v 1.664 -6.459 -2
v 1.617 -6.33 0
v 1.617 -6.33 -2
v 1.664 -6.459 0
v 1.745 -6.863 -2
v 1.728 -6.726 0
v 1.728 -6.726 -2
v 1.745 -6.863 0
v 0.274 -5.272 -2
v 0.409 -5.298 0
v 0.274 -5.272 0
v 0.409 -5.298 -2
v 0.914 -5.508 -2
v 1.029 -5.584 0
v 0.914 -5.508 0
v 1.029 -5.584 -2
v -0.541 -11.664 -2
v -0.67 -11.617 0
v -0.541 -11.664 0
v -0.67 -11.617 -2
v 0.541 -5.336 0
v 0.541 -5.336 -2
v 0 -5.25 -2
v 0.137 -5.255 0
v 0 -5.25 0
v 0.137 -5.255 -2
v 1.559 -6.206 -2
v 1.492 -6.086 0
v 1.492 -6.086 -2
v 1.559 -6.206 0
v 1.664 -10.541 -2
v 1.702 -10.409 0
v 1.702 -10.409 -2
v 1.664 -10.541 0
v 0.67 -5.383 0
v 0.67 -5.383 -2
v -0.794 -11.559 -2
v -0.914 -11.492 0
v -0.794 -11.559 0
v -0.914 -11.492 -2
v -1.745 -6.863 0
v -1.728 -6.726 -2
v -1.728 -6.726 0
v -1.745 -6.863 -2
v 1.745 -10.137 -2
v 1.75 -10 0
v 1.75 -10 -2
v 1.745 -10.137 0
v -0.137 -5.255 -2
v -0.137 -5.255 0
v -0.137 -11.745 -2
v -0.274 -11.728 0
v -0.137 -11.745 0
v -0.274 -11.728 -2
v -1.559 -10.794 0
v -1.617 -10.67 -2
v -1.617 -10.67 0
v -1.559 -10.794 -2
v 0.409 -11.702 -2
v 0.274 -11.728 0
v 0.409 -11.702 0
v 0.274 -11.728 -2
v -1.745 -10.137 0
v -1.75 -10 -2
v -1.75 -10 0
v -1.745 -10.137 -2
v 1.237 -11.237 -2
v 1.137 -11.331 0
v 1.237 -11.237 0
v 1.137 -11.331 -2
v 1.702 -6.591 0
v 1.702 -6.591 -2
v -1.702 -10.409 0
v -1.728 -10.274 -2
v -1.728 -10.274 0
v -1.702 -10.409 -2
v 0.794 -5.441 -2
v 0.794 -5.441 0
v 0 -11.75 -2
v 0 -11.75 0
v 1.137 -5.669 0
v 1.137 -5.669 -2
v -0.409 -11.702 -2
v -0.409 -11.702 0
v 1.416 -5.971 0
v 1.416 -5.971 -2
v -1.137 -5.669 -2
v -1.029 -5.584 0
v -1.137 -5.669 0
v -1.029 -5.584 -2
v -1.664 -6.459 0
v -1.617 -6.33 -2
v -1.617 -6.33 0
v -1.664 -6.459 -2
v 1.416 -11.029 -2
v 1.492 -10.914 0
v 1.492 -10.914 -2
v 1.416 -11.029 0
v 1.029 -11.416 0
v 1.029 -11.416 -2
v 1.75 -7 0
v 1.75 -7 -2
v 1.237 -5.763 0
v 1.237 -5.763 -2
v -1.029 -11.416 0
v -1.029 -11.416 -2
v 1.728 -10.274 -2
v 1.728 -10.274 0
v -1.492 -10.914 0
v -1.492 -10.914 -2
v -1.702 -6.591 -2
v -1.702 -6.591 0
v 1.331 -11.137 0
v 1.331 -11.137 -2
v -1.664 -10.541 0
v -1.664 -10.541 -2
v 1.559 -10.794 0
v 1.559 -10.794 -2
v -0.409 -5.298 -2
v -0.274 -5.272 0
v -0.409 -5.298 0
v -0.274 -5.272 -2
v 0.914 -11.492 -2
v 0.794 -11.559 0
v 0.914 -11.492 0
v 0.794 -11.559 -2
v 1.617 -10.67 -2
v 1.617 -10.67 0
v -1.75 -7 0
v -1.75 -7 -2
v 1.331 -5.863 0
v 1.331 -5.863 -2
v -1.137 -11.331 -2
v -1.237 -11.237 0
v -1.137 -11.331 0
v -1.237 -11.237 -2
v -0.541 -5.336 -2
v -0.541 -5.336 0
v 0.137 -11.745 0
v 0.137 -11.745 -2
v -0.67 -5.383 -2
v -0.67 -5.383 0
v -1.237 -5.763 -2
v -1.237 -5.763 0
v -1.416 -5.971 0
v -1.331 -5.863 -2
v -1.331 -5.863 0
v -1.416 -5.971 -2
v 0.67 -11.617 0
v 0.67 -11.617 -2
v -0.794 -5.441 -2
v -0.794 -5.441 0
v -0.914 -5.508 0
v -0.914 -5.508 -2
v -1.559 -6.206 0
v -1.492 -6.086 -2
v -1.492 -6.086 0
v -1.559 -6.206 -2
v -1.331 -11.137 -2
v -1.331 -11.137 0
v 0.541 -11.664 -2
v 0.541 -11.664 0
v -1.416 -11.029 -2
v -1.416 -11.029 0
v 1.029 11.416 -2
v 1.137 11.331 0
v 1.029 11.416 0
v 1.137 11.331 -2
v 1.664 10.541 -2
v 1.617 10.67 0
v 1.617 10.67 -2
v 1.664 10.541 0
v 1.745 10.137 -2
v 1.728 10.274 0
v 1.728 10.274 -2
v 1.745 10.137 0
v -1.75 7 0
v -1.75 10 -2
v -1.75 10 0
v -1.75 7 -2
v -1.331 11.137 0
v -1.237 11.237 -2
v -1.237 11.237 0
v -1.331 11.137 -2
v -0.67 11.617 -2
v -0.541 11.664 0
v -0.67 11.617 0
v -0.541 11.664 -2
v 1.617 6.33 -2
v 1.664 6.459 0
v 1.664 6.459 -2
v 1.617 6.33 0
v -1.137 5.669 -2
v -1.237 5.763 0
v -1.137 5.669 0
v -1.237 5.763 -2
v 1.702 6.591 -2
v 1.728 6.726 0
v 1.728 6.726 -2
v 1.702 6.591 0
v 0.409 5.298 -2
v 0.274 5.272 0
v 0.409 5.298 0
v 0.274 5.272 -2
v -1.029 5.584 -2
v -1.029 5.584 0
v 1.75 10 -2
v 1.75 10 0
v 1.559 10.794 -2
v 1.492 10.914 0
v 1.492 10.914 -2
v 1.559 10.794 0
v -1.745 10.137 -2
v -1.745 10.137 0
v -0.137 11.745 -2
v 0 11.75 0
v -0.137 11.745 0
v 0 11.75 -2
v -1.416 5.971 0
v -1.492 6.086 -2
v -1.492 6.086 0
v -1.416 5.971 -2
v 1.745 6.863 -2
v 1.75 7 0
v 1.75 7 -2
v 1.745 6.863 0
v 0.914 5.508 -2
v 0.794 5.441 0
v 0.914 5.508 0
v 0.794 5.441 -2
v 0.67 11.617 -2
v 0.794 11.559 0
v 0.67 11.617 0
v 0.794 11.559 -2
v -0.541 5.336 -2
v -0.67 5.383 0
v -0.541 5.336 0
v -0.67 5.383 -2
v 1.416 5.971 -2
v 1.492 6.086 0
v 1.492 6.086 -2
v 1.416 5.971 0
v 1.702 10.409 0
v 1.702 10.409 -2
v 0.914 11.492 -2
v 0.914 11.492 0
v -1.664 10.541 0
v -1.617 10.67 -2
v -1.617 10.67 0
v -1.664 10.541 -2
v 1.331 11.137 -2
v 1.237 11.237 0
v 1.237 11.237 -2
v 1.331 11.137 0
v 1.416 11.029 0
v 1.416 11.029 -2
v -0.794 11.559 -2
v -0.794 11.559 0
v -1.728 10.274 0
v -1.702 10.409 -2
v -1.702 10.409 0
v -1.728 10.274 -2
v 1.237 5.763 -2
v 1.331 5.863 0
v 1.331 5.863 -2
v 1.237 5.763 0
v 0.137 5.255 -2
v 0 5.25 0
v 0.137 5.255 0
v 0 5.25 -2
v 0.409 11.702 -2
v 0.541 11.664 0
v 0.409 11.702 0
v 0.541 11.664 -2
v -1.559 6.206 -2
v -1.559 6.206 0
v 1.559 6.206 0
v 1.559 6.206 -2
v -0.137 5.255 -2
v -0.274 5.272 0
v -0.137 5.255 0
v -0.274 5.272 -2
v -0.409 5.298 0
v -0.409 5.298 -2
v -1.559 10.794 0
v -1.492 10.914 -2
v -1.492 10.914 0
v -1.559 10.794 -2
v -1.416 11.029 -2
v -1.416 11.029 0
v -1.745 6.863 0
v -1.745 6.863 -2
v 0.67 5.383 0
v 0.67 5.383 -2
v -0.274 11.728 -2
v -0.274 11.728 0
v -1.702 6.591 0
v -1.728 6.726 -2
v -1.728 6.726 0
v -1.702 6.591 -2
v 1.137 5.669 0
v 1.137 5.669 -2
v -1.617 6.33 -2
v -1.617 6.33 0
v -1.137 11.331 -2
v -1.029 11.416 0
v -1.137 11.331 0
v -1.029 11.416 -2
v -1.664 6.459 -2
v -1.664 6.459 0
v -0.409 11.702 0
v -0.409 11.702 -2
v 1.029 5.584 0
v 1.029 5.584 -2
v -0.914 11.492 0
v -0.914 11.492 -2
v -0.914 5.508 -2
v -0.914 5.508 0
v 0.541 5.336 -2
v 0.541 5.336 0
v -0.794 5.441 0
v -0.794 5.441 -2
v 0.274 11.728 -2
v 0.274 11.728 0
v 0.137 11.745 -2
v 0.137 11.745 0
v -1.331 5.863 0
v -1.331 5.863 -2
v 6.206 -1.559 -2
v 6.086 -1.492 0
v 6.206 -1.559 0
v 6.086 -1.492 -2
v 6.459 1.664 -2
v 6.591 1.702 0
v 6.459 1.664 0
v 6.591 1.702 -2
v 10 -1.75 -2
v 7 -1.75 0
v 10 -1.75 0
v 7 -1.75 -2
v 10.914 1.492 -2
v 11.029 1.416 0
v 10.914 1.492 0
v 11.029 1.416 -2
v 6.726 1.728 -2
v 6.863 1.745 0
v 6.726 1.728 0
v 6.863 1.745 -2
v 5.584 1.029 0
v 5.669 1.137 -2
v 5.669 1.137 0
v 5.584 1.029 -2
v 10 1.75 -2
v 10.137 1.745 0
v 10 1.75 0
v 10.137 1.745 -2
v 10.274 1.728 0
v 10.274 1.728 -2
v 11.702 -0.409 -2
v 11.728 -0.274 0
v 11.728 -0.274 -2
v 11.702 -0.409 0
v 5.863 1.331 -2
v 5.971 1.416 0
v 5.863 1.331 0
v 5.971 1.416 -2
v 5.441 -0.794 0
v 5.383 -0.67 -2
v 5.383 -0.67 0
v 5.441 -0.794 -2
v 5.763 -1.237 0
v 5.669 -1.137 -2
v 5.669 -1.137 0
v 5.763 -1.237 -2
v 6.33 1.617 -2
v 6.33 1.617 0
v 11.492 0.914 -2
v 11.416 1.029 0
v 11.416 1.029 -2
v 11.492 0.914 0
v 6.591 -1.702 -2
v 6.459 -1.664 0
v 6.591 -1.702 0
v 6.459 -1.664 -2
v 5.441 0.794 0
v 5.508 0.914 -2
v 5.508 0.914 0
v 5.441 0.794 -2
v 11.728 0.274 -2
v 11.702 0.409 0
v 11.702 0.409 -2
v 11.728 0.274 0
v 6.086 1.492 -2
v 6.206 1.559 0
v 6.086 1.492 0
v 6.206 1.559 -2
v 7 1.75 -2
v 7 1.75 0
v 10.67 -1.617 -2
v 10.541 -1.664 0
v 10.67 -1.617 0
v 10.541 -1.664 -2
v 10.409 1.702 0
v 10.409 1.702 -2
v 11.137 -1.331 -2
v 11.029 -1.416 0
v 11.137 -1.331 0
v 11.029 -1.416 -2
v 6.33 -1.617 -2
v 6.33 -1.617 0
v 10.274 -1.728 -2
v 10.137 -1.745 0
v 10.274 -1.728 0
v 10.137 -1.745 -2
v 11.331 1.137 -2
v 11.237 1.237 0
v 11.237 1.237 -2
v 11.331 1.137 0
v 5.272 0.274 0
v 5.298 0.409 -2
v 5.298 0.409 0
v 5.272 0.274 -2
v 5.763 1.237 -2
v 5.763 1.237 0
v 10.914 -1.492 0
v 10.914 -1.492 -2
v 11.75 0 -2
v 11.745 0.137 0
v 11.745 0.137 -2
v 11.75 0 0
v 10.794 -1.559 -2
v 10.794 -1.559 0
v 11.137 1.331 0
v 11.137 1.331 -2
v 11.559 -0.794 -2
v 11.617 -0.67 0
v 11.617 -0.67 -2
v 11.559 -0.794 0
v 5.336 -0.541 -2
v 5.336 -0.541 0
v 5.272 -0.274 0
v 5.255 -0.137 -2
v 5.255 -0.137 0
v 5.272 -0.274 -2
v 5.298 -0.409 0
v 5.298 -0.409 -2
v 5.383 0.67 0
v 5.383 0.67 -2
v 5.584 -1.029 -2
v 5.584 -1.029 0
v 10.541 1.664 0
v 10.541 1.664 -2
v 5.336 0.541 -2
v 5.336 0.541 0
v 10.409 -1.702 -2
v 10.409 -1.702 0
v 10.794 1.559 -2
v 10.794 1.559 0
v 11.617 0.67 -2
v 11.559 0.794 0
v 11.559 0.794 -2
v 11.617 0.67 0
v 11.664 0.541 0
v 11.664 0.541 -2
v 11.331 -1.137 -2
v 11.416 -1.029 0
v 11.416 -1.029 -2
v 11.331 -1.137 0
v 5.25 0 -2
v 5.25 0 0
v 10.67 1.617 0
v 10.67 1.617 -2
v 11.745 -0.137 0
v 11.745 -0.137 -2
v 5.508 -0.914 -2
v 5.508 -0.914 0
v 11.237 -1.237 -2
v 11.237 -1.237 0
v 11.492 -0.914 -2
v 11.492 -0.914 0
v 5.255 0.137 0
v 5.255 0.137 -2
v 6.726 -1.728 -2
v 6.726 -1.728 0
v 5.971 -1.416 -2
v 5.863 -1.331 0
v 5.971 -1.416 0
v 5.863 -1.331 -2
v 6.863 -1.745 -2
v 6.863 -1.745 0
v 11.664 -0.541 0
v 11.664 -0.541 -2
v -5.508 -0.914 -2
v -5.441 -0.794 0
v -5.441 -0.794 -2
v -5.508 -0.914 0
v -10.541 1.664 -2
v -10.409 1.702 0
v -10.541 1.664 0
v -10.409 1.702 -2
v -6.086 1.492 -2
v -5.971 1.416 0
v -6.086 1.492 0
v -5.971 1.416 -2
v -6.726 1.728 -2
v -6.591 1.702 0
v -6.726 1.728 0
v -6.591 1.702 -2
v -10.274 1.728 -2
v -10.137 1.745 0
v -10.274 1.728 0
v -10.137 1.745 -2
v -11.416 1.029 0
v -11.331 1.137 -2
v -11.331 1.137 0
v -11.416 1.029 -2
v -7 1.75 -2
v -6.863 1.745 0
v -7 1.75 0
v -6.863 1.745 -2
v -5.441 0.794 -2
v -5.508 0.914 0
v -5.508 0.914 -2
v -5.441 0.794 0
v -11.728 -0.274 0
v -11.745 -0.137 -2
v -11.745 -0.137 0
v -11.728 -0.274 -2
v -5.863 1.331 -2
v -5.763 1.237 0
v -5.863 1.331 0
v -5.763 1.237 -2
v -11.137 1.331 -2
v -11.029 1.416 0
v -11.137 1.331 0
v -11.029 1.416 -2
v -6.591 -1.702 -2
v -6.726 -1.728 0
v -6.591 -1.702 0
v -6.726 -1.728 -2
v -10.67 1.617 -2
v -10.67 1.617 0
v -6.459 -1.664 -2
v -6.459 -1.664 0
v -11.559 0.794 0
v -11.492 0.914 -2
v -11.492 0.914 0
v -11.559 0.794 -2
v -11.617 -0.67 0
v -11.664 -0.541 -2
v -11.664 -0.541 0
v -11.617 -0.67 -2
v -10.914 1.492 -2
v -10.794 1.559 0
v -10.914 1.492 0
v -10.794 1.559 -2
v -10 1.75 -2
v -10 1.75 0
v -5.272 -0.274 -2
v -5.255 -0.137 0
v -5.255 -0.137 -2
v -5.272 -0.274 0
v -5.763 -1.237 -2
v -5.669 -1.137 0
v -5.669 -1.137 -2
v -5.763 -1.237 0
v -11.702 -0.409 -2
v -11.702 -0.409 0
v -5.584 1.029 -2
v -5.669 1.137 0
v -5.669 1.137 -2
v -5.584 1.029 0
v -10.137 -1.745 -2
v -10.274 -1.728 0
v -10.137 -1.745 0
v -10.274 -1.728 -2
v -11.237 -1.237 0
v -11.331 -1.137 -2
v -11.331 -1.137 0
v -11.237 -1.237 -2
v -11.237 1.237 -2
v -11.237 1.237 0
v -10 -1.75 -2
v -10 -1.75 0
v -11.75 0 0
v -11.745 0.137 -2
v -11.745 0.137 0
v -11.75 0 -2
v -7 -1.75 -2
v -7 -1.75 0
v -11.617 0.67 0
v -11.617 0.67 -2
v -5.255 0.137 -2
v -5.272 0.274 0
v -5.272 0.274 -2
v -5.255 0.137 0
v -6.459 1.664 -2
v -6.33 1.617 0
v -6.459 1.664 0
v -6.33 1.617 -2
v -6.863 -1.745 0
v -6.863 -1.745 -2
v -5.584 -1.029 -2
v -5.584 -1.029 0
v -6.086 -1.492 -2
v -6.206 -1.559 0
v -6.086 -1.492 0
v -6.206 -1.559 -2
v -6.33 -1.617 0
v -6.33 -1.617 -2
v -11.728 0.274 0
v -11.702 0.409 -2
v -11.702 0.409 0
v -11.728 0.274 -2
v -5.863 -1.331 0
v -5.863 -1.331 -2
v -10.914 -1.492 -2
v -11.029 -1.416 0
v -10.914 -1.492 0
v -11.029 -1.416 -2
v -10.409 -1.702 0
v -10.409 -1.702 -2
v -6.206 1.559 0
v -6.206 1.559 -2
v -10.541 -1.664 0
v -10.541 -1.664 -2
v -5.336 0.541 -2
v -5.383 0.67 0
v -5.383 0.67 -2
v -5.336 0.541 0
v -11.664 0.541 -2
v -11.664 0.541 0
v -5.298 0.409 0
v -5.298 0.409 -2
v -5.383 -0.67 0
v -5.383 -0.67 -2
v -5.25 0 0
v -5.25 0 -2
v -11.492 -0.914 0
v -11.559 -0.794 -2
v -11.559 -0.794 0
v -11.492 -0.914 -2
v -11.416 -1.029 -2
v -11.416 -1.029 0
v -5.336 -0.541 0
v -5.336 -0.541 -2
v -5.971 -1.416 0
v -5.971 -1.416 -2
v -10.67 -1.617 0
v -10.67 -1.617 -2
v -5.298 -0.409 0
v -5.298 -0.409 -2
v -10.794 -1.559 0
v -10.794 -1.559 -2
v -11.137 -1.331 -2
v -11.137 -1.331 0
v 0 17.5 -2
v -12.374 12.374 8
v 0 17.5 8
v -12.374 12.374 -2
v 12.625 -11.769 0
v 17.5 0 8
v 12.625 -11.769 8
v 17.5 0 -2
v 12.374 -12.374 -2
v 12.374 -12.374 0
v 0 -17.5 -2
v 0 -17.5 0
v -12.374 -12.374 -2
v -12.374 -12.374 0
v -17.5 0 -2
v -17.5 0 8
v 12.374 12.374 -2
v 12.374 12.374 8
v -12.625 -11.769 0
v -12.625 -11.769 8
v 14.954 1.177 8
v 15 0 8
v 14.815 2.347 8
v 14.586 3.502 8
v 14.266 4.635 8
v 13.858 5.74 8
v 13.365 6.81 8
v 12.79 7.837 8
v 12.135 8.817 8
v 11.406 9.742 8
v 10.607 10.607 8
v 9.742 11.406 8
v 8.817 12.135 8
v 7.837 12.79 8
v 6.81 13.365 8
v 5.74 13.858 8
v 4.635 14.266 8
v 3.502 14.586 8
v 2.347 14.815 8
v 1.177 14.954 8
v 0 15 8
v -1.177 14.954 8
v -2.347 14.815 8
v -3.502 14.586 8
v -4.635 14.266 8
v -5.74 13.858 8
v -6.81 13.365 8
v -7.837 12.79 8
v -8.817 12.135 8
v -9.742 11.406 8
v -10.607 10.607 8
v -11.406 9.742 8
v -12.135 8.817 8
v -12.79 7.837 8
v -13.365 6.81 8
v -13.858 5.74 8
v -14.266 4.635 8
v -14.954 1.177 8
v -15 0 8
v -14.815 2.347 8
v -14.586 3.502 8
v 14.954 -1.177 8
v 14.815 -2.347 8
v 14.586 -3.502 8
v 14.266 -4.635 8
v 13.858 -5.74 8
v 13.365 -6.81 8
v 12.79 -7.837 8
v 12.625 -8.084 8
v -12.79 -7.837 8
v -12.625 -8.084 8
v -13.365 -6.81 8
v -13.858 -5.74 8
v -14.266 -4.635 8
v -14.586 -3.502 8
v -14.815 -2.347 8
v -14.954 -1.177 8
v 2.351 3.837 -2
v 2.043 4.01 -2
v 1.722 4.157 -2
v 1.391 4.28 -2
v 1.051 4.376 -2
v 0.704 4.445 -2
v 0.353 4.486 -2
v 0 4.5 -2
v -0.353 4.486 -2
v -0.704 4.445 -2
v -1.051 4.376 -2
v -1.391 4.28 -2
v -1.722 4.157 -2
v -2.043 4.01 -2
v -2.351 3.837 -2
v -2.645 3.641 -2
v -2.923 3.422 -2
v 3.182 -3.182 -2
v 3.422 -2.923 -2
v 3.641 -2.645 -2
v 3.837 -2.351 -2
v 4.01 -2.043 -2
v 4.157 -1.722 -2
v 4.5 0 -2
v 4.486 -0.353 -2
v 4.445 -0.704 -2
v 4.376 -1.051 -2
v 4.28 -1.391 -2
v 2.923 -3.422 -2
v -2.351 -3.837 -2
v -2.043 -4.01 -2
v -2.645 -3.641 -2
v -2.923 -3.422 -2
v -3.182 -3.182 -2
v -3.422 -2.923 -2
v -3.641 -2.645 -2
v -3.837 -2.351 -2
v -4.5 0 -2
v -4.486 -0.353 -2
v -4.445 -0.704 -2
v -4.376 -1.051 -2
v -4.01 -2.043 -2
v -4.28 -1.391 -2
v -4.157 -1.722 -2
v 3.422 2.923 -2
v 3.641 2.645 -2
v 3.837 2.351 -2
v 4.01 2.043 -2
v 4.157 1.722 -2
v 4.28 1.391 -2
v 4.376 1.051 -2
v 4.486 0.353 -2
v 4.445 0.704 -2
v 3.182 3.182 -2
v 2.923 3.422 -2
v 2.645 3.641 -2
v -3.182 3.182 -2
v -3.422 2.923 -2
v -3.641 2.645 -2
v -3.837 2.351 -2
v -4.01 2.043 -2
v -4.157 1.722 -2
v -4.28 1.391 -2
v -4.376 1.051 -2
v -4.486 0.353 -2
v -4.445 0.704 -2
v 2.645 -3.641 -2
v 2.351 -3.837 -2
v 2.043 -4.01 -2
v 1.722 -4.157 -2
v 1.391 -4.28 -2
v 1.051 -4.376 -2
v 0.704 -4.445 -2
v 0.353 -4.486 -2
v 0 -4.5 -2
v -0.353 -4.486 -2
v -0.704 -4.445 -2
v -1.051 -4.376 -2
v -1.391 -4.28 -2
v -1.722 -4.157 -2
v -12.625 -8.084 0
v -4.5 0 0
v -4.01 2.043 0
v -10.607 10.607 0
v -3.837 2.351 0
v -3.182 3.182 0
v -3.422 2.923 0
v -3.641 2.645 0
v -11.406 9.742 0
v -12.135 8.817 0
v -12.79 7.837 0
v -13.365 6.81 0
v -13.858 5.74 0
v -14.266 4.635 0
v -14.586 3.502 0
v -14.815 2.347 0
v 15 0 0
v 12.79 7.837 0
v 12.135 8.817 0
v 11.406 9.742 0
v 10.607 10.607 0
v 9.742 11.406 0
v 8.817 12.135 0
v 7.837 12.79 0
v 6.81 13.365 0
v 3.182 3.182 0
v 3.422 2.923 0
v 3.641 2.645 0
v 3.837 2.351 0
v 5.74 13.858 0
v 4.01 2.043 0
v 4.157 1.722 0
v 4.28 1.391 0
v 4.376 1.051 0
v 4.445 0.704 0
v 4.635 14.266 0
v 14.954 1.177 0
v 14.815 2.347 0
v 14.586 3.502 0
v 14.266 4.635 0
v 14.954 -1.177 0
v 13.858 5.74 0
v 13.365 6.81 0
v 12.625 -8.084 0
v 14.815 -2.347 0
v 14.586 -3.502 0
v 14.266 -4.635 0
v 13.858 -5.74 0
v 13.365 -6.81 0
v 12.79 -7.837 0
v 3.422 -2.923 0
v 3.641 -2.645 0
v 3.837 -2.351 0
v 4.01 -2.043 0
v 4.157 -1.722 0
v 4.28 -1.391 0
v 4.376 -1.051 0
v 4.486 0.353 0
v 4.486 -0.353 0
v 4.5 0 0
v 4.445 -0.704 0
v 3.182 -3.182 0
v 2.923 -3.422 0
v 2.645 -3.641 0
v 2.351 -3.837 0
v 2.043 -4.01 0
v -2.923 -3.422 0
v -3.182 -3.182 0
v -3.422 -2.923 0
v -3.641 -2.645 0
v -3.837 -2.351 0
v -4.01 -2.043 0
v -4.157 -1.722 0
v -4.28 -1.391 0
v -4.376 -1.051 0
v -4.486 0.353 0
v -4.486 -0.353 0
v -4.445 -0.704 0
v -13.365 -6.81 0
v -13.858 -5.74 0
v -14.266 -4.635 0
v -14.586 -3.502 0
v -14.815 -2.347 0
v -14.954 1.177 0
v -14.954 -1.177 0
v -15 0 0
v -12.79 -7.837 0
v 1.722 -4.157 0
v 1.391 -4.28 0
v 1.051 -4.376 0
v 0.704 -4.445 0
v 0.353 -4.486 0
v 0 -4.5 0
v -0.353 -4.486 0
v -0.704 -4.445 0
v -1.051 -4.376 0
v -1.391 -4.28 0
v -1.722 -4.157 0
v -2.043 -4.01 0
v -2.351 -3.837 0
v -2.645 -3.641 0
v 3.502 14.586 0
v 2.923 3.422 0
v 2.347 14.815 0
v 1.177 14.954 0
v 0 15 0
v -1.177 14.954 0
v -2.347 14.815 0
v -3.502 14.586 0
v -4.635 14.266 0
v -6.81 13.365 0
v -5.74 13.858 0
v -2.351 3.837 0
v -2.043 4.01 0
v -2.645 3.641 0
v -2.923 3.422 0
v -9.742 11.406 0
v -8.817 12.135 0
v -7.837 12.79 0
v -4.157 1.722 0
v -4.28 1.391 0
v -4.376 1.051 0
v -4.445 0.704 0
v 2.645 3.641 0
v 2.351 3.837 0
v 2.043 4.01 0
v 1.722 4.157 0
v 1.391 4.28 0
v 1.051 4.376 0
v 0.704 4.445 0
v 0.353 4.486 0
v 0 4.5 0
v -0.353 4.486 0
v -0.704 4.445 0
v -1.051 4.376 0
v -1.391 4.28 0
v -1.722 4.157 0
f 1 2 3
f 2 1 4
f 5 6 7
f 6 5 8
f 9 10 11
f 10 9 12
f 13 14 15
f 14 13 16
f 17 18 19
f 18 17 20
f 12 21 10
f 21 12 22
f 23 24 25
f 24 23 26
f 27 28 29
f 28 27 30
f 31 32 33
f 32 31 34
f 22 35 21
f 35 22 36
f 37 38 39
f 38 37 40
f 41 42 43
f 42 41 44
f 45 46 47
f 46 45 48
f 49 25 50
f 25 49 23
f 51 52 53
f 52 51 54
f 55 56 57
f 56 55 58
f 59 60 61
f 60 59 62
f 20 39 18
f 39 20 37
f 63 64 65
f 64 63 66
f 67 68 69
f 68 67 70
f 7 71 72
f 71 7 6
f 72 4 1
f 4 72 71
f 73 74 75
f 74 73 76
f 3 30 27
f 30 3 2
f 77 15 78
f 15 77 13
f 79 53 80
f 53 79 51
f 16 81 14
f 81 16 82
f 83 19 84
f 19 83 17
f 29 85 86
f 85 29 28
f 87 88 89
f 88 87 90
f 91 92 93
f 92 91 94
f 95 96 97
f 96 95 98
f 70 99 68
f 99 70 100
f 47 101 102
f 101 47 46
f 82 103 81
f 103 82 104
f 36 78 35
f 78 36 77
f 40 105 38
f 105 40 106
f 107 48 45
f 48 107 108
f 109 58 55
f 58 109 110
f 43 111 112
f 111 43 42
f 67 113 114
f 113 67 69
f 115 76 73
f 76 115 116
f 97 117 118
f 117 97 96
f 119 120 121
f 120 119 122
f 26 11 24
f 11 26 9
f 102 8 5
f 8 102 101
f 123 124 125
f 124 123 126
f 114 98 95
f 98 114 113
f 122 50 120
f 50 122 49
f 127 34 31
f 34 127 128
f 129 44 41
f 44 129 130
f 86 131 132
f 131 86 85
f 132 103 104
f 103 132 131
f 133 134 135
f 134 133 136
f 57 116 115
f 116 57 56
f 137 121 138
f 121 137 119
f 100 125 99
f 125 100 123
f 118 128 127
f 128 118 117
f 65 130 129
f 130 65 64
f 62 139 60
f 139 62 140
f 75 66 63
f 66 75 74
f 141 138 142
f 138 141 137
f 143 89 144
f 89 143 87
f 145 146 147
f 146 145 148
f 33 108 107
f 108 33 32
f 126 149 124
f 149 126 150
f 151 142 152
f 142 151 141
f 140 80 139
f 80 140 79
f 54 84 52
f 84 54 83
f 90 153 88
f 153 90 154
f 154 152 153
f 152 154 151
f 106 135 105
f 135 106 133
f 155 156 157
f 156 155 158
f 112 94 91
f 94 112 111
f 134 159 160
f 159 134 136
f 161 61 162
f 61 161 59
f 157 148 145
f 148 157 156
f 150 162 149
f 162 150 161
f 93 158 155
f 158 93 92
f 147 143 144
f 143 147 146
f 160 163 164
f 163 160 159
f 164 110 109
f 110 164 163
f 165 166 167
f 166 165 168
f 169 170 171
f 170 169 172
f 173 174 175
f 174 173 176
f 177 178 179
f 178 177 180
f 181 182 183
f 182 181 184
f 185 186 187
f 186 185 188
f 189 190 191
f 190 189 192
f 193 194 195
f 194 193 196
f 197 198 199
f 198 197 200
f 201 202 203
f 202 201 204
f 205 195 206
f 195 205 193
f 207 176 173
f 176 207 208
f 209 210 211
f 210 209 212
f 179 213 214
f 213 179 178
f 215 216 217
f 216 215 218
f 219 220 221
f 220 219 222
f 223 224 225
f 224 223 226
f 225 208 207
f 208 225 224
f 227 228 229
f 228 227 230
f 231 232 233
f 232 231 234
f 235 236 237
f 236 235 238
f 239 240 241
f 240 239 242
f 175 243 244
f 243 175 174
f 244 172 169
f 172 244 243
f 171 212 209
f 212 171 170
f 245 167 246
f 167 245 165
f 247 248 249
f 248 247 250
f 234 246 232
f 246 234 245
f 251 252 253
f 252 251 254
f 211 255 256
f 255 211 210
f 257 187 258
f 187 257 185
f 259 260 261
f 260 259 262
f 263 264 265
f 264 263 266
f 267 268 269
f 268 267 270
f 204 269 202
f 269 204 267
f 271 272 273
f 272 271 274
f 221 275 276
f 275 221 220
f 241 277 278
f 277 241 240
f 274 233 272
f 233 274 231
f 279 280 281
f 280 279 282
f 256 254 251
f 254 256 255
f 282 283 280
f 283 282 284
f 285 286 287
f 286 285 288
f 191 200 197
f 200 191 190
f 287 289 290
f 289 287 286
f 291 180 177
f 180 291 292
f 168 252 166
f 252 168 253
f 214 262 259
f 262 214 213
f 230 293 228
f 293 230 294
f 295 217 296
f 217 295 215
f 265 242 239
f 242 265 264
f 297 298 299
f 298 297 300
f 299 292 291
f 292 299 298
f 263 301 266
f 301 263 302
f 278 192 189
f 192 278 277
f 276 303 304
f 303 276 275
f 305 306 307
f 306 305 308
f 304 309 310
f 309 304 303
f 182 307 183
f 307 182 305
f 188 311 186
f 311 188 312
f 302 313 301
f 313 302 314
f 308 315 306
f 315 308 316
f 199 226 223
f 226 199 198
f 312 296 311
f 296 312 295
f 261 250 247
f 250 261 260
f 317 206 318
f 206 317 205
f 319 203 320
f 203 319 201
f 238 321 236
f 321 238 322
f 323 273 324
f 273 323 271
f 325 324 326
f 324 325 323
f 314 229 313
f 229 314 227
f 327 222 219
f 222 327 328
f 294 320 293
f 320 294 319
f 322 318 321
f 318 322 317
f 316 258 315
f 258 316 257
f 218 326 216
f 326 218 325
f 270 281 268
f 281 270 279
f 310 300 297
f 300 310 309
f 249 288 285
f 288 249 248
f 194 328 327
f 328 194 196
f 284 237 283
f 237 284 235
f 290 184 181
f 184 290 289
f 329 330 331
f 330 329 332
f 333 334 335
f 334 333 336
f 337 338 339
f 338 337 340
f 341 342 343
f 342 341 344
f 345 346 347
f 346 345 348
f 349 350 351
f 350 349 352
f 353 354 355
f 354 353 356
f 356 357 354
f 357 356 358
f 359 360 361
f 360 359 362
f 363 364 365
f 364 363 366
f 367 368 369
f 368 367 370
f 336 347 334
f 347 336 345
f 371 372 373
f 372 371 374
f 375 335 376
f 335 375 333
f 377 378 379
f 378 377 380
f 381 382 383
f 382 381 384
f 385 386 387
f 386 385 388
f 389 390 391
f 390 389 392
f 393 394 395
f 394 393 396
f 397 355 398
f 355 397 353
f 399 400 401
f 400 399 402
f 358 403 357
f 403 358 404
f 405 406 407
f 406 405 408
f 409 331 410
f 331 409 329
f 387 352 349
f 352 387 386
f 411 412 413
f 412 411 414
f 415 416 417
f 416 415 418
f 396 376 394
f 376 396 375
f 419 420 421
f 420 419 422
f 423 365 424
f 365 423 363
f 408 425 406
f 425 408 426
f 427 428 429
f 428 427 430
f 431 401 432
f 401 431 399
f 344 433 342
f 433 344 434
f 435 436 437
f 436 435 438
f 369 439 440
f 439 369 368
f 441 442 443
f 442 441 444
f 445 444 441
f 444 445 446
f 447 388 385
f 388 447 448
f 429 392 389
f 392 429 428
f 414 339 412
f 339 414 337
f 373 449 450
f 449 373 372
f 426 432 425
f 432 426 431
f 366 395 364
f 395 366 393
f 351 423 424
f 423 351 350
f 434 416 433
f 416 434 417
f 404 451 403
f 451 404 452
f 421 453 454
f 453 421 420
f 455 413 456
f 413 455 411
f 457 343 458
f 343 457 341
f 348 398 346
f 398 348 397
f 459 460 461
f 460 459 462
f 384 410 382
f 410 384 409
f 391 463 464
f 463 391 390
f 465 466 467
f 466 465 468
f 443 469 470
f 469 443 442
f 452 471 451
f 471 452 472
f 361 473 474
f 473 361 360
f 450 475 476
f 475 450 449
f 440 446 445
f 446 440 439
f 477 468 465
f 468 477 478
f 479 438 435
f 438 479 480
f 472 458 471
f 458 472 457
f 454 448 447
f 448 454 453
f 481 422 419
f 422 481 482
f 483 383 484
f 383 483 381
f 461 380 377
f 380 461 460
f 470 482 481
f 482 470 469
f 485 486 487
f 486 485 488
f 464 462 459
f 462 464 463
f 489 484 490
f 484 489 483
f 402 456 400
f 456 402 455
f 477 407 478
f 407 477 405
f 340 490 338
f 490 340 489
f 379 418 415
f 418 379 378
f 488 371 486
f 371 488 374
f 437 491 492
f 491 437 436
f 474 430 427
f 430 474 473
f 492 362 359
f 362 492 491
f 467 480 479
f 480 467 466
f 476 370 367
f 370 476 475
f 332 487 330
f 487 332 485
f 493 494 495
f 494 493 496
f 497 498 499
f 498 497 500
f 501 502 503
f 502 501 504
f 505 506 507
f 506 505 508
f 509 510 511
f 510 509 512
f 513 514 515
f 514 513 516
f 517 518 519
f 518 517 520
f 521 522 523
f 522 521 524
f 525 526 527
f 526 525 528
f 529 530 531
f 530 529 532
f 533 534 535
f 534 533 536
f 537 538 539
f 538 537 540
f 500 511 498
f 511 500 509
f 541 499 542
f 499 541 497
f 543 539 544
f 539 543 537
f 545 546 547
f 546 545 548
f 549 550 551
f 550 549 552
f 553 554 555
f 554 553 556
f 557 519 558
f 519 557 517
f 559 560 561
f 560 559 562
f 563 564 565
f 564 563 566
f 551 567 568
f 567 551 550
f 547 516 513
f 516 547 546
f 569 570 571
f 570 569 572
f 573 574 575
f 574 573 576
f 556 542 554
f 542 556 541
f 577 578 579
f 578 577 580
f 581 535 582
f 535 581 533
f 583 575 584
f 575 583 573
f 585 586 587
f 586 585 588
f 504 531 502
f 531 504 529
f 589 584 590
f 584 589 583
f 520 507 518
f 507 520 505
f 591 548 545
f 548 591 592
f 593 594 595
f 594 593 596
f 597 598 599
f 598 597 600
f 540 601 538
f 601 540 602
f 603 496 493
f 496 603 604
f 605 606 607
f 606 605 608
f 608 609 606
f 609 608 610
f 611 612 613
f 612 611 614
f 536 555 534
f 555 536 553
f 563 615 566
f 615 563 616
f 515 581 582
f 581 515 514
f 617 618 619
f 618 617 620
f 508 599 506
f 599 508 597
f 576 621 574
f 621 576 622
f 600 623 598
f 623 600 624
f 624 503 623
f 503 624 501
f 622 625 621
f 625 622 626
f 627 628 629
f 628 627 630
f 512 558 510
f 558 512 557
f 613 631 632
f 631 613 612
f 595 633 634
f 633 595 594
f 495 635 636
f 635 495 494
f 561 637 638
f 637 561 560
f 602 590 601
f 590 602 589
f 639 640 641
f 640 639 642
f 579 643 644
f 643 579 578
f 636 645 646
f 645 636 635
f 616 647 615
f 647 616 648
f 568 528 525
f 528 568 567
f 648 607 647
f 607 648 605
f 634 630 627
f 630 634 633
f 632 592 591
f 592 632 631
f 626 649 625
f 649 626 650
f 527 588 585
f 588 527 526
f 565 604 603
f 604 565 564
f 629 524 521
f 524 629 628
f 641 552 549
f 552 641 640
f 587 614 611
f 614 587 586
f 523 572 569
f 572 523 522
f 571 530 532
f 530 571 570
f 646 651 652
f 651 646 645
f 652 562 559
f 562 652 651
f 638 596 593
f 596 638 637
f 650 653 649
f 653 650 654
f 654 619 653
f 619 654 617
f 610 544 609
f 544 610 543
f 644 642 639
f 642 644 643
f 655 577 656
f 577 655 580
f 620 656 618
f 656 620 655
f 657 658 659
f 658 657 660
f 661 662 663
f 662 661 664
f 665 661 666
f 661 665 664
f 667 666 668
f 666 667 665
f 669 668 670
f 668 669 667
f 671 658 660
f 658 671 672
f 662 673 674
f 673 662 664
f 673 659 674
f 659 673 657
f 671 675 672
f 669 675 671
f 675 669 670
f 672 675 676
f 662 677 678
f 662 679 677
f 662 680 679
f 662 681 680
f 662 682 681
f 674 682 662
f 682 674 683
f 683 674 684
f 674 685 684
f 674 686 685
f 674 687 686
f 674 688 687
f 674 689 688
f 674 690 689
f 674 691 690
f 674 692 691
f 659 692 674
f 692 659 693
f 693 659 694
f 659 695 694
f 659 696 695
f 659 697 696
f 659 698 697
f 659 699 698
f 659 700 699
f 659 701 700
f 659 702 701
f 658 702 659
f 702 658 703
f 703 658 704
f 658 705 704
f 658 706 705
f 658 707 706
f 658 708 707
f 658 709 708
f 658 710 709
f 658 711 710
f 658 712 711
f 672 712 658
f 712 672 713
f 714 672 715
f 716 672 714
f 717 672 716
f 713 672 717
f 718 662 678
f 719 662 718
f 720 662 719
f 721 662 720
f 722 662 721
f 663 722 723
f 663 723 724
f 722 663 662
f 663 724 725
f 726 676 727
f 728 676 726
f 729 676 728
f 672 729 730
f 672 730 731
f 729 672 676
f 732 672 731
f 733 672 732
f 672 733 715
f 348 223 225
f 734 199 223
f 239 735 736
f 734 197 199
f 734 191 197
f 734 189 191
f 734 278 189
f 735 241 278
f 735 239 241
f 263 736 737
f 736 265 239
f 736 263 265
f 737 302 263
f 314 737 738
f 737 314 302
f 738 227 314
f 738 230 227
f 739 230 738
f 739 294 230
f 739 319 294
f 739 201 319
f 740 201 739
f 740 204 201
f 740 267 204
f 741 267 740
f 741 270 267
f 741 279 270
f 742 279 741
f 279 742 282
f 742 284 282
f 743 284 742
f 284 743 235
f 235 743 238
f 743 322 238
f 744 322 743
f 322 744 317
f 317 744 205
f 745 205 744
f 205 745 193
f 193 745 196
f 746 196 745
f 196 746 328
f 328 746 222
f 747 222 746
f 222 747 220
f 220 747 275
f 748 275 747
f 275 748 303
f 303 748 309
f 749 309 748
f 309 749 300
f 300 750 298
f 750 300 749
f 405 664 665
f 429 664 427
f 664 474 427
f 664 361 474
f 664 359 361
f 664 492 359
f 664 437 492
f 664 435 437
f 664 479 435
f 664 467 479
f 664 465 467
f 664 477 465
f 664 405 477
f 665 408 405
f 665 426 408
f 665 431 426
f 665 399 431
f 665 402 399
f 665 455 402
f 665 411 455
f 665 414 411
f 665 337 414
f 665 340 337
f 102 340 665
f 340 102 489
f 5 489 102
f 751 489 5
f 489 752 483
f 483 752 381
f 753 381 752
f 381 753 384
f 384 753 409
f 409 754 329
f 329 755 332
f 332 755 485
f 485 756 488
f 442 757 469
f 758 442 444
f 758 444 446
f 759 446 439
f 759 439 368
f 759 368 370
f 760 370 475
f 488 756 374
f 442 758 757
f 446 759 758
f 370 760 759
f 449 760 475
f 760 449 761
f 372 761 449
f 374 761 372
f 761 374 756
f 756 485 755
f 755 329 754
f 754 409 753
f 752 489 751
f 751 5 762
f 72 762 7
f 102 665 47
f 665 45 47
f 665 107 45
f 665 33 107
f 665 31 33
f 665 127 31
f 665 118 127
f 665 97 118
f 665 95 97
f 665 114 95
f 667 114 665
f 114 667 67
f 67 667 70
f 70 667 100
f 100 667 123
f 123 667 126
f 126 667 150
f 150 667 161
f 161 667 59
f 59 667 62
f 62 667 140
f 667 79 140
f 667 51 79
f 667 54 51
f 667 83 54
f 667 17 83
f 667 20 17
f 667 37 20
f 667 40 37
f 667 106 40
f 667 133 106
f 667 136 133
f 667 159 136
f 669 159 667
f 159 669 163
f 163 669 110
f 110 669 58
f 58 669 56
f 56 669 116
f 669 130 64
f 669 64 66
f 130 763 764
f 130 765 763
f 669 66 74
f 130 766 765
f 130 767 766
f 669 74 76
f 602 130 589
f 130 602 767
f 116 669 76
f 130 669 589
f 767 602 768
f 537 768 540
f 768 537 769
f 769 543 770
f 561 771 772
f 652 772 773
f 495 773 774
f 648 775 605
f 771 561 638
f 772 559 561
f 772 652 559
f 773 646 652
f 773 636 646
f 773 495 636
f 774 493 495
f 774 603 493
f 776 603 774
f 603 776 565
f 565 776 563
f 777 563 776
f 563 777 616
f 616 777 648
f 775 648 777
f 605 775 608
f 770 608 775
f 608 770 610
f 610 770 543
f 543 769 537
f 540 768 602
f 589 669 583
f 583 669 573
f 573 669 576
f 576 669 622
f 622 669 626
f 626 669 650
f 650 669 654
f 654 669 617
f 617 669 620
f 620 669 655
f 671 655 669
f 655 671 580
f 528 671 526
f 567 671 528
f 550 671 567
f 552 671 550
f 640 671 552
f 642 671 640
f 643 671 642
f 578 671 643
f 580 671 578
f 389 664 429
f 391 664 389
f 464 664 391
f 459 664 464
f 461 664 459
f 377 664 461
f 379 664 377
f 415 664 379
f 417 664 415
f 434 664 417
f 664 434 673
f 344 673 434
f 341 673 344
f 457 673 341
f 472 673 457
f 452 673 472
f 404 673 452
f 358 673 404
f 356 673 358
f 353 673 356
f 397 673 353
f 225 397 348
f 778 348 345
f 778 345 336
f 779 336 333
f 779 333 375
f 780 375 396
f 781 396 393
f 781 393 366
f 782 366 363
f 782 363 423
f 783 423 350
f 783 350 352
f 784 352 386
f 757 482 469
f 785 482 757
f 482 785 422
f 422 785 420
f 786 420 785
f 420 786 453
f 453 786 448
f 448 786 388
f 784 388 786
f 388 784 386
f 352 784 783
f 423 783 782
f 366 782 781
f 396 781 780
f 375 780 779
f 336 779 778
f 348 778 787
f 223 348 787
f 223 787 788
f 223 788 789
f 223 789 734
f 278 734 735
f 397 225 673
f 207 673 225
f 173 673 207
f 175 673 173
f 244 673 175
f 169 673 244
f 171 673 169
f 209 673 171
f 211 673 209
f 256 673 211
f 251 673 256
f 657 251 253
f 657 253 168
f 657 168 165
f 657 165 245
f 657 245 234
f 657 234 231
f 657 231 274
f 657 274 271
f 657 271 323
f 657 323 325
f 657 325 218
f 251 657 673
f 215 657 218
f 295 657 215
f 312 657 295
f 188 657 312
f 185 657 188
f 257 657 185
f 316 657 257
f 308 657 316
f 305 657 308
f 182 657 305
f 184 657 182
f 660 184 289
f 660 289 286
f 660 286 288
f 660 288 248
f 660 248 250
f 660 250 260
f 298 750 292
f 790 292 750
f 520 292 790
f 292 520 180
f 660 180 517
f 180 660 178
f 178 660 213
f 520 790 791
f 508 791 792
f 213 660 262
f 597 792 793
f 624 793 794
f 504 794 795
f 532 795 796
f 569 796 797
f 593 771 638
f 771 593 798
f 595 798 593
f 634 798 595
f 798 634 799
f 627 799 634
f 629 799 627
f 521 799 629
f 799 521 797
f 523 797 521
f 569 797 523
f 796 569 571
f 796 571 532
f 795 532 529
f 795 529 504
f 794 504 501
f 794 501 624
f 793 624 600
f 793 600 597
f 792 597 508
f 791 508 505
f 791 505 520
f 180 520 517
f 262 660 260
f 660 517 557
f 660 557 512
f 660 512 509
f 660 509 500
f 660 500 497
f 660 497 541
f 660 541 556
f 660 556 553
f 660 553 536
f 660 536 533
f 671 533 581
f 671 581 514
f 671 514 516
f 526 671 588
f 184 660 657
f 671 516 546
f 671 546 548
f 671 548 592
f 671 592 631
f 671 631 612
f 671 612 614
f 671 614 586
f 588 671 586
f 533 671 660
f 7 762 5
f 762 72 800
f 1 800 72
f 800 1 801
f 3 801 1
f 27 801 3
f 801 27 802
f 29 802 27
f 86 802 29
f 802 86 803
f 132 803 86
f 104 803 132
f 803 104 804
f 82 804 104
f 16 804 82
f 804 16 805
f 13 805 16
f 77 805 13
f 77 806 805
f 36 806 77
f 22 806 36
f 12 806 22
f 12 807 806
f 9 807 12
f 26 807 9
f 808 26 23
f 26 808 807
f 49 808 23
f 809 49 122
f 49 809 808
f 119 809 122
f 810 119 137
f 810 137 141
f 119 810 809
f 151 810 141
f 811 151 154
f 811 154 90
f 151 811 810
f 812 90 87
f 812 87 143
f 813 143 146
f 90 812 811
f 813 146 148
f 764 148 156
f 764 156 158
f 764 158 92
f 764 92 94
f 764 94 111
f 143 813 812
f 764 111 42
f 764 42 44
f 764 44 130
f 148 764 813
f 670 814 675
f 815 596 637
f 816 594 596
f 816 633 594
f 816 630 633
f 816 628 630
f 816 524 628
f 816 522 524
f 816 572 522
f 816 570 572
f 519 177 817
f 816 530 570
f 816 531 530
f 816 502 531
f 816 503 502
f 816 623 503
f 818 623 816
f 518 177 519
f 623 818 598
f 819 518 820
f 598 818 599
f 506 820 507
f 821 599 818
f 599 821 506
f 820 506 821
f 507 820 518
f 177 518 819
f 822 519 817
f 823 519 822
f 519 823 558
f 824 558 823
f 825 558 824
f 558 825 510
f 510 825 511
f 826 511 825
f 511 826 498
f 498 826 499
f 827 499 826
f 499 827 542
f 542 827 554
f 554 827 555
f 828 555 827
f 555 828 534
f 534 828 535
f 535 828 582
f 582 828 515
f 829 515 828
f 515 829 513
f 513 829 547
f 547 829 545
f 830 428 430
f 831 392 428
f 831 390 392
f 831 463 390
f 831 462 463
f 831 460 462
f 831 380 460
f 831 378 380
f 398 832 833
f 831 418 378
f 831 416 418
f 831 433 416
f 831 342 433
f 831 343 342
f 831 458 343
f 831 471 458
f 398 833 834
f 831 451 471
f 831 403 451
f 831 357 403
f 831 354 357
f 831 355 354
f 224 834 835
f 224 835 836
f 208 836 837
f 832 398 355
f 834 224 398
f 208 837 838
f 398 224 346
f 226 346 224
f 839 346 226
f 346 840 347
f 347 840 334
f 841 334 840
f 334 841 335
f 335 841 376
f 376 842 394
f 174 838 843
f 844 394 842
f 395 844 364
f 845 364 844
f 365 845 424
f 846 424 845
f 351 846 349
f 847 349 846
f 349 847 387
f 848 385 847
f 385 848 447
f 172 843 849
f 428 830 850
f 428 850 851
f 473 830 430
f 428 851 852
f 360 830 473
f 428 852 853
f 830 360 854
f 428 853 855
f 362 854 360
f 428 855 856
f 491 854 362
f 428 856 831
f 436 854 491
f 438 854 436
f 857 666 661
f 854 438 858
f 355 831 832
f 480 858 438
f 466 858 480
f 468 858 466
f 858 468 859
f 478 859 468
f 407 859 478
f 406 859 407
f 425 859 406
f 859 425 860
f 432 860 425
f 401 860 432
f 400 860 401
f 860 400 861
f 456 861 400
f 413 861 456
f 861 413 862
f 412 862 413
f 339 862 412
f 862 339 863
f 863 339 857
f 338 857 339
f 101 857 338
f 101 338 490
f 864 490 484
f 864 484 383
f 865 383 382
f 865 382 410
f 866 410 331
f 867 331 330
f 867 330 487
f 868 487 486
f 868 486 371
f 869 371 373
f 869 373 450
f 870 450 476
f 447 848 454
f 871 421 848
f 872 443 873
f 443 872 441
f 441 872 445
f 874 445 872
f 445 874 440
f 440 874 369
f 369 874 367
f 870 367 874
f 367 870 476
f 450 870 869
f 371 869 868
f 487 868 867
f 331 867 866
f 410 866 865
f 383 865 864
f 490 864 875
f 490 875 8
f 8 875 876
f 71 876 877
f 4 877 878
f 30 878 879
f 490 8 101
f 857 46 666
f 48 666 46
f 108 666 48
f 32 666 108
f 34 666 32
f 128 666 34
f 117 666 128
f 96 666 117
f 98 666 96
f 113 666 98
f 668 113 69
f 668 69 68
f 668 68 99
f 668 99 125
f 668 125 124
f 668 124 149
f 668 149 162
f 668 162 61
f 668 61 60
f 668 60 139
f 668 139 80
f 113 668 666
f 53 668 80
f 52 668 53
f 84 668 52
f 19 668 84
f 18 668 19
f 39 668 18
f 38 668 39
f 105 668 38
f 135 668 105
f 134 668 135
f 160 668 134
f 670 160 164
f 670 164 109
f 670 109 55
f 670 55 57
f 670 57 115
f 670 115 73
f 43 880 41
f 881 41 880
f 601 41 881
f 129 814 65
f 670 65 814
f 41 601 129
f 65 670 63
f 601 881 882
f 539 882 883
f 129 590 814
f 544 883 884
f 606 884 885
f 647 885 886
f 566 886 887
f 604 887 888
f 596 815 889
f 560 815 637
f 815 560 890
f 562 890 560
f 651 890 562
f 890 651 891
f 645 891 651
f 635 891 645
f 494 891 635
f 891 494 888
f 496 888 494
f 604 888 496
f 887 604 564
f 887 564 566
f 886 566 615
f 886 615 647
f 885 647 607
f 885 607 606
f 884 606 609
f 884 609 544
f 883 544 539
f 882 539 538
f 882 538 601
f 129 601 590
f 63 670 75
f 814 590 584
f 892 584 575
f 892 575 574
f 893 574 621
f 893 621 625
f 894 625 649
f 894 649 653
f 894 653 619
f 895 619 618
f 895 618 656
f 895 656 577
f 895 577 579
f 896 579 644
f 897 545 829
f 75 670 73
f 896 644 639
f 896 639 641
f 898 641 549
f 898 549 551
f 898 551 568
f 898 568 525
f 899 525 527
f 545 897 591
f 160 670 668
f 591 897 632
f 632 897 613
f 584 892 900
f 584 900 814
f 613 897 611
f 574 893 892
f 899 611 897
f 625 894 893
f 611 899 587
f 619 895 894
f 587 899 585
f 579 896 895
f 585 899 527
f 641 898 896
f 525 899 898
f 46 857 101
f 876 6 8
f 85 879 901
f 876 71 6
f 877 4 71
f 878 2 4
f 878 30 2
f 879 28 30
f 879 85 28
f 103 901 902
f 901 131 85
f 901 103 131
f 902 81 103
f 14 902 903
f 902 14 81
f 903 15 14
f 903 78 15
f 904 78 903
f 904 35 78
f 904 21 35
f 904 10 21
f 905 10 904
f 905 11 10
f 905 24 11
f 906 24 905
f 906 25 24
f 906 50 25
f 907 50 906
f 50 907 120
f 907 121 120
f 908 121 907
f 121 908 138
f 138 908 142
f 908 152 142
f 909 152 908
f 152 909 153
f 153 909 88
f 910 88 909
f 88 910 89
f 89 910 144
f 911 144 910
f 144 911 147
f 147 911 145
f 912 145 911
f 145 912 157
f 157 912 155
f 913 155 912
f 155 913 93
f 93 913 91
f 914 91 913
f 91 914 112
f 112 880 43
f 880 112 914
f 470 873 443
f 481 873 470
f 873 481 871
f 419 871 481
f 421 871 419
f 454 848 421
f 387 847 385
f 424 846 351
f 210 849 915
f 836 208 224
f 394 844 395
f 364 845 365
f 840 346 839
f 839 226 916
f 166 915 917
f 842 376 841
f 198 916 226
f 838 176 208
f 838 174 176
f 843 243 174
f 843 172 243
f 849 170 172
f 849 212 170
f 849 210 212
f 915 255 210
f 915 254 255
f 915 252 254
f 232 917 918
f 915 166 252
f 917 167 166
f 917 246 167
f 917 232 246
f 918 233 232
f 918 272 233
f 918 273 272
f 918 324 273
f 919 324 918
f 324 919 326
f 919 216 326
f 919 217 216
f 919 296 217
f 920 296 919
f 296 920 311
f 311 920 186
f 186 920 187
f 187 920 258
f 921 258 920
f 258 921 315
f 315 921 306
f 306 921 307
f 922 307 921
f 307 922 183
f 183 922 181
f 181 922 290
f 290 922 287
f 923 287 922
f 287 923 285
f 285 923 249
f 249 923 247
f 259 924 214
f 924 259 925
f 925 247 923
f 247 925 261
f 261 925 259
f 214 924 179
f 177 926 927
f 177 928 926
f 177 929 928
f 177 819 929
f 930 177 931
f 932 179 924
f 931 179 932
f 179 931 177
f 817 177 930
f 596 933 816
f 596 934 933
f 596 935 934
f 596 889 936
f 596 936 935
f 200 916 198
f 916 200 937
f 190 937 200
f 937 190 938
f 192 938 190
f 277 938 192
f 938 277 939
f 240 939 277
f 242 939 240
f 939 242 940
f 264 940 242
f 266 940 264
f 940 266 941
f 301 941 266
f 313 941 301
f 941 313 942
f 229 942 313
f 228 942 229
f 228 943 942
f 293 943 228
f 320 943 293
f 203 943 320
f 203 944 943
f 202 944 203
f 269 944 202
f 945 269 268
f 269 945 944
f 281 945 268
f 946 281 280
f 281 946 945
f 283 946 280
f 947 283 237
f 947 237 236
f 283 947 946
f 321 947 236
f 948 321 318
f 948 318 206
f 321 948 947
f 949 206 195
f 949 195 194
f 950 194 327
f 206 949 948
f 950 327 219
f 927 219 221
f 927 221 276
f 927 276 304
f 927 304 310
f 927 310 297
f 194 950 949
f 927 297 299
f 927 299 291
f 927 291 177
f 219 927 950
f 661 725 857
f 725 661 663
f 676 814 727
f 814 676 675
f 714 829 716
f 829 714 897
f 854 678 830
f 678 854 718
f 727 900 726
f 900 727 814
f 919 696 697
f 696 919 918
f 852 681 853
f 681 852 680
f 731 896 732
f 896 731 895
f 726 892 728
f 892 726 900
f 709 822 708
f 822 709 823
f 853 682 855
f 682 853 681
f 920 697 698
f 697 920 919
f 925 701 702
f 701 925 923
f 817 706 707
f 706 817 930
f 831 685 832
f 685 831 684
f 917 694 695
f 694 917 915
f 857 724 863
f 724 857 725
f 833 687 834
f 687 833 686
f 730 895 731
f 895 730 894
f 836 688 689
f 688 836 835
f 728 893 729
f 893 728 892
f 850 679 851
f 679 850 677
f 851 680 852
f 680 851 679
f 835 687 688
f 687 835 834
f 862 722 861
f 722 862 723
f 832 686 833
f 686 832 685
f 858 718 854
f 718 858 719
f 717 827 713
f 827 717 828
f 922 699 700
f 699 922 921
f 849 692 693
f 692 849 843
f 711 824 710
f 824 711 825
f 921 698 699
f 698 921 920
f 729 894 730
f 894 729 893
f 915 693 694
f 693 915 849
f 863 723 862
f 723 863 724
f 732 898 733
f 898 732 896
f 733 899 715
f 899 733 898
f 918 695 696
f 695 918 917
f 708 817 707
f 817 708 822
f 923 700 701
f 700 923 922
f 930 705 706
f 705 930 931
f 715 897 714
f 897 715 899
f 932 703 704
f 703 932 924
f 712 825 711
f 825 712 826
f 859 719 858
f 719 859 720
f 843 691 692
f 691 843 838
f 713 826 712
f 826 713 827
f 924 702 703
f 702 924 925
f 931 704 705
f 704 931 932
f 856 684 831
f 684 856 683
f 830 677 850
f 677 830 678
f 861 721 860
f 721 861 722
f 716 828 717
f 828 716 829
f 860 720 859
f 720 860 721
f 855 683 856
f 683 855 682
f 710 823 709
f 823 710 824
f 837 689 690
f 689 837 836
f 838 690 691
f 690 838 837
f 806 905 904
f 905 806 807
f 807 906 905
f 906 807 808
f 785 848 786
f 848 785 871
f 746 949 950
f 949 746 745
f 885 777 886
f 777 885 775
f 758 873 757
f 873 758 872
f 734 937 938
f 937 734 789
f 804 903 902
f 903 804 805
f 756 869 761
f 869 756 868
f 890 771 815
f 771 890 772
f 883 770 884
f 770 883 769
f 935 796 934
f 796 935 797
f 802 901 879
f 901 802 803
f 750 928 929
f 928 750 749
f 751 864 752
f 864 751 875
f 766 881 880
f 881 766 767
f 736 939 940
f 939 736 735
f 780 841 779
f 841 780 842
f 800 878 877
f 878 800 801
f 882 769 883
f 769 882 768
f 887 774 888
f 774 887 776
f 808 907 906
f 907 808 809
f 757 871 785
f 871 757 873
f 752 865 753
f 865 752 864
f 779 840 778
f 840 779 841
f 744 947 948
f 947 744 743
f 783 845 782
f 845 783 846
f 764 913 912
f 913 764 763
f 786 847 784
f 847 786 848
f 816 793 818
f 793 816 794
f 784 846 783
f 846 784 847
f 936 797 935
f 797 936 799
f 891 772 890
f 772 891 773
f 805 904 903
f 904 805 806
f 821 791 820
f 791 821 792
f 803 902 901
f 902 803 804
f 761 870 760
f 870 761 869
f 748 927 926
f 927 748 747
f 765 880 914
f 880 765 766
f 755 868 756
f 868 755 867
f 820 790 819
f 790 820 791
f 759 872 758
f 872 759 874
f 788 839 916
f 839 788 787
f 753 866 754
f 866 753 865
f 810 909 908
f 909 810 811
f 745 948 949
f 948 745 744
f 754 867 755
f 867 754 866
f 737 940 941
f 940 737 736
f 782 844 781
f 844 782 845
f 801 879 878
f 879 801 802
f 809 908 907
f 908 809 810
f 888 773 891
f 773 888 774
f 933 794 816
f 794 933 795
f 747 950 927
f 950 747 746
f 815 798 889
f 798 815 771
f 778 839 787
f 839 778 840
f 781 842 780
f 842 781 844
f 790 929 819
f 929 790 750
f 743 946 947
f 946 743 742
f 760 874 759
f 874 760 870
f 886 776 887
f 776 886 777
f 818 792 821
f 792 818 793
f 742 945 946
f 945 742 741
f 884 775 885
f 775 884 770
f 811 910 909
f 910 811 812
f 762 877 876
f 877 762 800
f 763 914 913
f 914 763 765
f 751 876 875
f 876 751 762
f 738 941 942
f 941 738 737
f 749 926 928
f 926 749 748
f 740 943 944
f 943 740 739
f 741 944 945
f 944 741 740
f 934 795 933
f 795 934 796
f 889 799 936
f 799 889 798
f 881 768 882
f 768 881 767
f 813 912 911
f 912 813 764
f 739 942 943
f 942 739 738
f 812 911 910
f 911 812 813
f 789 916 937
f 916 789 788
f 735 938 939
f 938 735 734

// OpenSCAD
/*
Customisable Motor Protection for Quadcopter

    - by Harlo
    - 16/05/2016
    
    **Standard variables are based on an Emax Nighthawk 250**
*/


//Fixing Screws Diameter
screw_dia = 3.5; //[0:0.25:8]
//Distance Between Screw Centers
screw_seperation = 17; //[0:0.25:50]
//Screw Slide Distance
screw_slide = 3; //[0:0.25:10]
//Rotate the fixings (degrees)
screw_rotation = 0; //[0:1:90]
//Motor Shaft Diameter (add tolerance)
shaft_dia = 9; //[0:0.25:15]
//Arm Diameter (of mount)
arm_dia = 30; //[5:0.25:80]
//Arm Width
arm_width = 25.25; //[3:0.25:80]
//General Smoothness 
resolution = 80; //[20:1:180]
//Outside Diameter
protector_dia = 35; //[20:0.25:120]
//Outer Shape/Smoothness
protector_res = 8; //[8:1:180]
//Protector Height (Total Z)
protector_height = 10; //[1:0.1:60]
//Protector Lower Thickness
protector_bottom_thickness = 2; //[0.5:0.1:10]
//Rotate (for viewing while editing)
turn = -90; //[0:15:360]

//Internal Variables
arm_length = arm_dia*3;
screw_height = 20 * 1;
arm_thickness = 20 * 1;
shaft_height = 20 * 1;

//Render
rotate([0,0,turn]){
    protector_with_cuts();
}

//Modules

module protector_with_cuts(){
    difference(){
        protector();
        cut_arm();
        cut_base();
        cut_screws();
        cut_shaft();        
    }
}

module protector(){
    translate([0,0,protector_height/2 - protector_bottom_thickness]){
        cylinder(h = protector_height, d = protector_dia, center = true, $fn = protector_res);
    }
}


//CUTTING Modules
module cut_shaft(){
    cylinder(h = shaft_height, d = shaft_dia, center = true, $fn = resolution);
}

module cut_screws(){
    rotate([0,0,screw_rotation]){
        screw_placed();
        rotate([0,0,90]){
            screw_placed();
        }
    }
}

module screw_placed(){
    translate([screw_seperation/2,0,0]){
        screw_slide();
    }
    
    translate([-screw_seperation/2,0,0]){
        screw_slide();
    }
}

module screw_slide(){
    hull(){
        translate([screw_slide/2,0,0]){
            screw(screw_height, screw_dia);
        }
        translate([-screw_slide/2,0,0]){
            screw(screw_height, screw_dia);
        }
    }
}

module screw(height, diameter){
    cylinder(h = height, d = diameter, $fn = resolution, center = true);
}

module cut_base(){
    translate([0,0,arm_thickness/2]){
        cylinder(h = arm_thickness, d = arm_dia, $fn = resolution, center = true);
    }
}

module cut_arm(){
    translate([arm_length/2,0,arm_thickness/2]){
        cube([arm_length, arm_width, arm_thickness], center = true);
    }
}
